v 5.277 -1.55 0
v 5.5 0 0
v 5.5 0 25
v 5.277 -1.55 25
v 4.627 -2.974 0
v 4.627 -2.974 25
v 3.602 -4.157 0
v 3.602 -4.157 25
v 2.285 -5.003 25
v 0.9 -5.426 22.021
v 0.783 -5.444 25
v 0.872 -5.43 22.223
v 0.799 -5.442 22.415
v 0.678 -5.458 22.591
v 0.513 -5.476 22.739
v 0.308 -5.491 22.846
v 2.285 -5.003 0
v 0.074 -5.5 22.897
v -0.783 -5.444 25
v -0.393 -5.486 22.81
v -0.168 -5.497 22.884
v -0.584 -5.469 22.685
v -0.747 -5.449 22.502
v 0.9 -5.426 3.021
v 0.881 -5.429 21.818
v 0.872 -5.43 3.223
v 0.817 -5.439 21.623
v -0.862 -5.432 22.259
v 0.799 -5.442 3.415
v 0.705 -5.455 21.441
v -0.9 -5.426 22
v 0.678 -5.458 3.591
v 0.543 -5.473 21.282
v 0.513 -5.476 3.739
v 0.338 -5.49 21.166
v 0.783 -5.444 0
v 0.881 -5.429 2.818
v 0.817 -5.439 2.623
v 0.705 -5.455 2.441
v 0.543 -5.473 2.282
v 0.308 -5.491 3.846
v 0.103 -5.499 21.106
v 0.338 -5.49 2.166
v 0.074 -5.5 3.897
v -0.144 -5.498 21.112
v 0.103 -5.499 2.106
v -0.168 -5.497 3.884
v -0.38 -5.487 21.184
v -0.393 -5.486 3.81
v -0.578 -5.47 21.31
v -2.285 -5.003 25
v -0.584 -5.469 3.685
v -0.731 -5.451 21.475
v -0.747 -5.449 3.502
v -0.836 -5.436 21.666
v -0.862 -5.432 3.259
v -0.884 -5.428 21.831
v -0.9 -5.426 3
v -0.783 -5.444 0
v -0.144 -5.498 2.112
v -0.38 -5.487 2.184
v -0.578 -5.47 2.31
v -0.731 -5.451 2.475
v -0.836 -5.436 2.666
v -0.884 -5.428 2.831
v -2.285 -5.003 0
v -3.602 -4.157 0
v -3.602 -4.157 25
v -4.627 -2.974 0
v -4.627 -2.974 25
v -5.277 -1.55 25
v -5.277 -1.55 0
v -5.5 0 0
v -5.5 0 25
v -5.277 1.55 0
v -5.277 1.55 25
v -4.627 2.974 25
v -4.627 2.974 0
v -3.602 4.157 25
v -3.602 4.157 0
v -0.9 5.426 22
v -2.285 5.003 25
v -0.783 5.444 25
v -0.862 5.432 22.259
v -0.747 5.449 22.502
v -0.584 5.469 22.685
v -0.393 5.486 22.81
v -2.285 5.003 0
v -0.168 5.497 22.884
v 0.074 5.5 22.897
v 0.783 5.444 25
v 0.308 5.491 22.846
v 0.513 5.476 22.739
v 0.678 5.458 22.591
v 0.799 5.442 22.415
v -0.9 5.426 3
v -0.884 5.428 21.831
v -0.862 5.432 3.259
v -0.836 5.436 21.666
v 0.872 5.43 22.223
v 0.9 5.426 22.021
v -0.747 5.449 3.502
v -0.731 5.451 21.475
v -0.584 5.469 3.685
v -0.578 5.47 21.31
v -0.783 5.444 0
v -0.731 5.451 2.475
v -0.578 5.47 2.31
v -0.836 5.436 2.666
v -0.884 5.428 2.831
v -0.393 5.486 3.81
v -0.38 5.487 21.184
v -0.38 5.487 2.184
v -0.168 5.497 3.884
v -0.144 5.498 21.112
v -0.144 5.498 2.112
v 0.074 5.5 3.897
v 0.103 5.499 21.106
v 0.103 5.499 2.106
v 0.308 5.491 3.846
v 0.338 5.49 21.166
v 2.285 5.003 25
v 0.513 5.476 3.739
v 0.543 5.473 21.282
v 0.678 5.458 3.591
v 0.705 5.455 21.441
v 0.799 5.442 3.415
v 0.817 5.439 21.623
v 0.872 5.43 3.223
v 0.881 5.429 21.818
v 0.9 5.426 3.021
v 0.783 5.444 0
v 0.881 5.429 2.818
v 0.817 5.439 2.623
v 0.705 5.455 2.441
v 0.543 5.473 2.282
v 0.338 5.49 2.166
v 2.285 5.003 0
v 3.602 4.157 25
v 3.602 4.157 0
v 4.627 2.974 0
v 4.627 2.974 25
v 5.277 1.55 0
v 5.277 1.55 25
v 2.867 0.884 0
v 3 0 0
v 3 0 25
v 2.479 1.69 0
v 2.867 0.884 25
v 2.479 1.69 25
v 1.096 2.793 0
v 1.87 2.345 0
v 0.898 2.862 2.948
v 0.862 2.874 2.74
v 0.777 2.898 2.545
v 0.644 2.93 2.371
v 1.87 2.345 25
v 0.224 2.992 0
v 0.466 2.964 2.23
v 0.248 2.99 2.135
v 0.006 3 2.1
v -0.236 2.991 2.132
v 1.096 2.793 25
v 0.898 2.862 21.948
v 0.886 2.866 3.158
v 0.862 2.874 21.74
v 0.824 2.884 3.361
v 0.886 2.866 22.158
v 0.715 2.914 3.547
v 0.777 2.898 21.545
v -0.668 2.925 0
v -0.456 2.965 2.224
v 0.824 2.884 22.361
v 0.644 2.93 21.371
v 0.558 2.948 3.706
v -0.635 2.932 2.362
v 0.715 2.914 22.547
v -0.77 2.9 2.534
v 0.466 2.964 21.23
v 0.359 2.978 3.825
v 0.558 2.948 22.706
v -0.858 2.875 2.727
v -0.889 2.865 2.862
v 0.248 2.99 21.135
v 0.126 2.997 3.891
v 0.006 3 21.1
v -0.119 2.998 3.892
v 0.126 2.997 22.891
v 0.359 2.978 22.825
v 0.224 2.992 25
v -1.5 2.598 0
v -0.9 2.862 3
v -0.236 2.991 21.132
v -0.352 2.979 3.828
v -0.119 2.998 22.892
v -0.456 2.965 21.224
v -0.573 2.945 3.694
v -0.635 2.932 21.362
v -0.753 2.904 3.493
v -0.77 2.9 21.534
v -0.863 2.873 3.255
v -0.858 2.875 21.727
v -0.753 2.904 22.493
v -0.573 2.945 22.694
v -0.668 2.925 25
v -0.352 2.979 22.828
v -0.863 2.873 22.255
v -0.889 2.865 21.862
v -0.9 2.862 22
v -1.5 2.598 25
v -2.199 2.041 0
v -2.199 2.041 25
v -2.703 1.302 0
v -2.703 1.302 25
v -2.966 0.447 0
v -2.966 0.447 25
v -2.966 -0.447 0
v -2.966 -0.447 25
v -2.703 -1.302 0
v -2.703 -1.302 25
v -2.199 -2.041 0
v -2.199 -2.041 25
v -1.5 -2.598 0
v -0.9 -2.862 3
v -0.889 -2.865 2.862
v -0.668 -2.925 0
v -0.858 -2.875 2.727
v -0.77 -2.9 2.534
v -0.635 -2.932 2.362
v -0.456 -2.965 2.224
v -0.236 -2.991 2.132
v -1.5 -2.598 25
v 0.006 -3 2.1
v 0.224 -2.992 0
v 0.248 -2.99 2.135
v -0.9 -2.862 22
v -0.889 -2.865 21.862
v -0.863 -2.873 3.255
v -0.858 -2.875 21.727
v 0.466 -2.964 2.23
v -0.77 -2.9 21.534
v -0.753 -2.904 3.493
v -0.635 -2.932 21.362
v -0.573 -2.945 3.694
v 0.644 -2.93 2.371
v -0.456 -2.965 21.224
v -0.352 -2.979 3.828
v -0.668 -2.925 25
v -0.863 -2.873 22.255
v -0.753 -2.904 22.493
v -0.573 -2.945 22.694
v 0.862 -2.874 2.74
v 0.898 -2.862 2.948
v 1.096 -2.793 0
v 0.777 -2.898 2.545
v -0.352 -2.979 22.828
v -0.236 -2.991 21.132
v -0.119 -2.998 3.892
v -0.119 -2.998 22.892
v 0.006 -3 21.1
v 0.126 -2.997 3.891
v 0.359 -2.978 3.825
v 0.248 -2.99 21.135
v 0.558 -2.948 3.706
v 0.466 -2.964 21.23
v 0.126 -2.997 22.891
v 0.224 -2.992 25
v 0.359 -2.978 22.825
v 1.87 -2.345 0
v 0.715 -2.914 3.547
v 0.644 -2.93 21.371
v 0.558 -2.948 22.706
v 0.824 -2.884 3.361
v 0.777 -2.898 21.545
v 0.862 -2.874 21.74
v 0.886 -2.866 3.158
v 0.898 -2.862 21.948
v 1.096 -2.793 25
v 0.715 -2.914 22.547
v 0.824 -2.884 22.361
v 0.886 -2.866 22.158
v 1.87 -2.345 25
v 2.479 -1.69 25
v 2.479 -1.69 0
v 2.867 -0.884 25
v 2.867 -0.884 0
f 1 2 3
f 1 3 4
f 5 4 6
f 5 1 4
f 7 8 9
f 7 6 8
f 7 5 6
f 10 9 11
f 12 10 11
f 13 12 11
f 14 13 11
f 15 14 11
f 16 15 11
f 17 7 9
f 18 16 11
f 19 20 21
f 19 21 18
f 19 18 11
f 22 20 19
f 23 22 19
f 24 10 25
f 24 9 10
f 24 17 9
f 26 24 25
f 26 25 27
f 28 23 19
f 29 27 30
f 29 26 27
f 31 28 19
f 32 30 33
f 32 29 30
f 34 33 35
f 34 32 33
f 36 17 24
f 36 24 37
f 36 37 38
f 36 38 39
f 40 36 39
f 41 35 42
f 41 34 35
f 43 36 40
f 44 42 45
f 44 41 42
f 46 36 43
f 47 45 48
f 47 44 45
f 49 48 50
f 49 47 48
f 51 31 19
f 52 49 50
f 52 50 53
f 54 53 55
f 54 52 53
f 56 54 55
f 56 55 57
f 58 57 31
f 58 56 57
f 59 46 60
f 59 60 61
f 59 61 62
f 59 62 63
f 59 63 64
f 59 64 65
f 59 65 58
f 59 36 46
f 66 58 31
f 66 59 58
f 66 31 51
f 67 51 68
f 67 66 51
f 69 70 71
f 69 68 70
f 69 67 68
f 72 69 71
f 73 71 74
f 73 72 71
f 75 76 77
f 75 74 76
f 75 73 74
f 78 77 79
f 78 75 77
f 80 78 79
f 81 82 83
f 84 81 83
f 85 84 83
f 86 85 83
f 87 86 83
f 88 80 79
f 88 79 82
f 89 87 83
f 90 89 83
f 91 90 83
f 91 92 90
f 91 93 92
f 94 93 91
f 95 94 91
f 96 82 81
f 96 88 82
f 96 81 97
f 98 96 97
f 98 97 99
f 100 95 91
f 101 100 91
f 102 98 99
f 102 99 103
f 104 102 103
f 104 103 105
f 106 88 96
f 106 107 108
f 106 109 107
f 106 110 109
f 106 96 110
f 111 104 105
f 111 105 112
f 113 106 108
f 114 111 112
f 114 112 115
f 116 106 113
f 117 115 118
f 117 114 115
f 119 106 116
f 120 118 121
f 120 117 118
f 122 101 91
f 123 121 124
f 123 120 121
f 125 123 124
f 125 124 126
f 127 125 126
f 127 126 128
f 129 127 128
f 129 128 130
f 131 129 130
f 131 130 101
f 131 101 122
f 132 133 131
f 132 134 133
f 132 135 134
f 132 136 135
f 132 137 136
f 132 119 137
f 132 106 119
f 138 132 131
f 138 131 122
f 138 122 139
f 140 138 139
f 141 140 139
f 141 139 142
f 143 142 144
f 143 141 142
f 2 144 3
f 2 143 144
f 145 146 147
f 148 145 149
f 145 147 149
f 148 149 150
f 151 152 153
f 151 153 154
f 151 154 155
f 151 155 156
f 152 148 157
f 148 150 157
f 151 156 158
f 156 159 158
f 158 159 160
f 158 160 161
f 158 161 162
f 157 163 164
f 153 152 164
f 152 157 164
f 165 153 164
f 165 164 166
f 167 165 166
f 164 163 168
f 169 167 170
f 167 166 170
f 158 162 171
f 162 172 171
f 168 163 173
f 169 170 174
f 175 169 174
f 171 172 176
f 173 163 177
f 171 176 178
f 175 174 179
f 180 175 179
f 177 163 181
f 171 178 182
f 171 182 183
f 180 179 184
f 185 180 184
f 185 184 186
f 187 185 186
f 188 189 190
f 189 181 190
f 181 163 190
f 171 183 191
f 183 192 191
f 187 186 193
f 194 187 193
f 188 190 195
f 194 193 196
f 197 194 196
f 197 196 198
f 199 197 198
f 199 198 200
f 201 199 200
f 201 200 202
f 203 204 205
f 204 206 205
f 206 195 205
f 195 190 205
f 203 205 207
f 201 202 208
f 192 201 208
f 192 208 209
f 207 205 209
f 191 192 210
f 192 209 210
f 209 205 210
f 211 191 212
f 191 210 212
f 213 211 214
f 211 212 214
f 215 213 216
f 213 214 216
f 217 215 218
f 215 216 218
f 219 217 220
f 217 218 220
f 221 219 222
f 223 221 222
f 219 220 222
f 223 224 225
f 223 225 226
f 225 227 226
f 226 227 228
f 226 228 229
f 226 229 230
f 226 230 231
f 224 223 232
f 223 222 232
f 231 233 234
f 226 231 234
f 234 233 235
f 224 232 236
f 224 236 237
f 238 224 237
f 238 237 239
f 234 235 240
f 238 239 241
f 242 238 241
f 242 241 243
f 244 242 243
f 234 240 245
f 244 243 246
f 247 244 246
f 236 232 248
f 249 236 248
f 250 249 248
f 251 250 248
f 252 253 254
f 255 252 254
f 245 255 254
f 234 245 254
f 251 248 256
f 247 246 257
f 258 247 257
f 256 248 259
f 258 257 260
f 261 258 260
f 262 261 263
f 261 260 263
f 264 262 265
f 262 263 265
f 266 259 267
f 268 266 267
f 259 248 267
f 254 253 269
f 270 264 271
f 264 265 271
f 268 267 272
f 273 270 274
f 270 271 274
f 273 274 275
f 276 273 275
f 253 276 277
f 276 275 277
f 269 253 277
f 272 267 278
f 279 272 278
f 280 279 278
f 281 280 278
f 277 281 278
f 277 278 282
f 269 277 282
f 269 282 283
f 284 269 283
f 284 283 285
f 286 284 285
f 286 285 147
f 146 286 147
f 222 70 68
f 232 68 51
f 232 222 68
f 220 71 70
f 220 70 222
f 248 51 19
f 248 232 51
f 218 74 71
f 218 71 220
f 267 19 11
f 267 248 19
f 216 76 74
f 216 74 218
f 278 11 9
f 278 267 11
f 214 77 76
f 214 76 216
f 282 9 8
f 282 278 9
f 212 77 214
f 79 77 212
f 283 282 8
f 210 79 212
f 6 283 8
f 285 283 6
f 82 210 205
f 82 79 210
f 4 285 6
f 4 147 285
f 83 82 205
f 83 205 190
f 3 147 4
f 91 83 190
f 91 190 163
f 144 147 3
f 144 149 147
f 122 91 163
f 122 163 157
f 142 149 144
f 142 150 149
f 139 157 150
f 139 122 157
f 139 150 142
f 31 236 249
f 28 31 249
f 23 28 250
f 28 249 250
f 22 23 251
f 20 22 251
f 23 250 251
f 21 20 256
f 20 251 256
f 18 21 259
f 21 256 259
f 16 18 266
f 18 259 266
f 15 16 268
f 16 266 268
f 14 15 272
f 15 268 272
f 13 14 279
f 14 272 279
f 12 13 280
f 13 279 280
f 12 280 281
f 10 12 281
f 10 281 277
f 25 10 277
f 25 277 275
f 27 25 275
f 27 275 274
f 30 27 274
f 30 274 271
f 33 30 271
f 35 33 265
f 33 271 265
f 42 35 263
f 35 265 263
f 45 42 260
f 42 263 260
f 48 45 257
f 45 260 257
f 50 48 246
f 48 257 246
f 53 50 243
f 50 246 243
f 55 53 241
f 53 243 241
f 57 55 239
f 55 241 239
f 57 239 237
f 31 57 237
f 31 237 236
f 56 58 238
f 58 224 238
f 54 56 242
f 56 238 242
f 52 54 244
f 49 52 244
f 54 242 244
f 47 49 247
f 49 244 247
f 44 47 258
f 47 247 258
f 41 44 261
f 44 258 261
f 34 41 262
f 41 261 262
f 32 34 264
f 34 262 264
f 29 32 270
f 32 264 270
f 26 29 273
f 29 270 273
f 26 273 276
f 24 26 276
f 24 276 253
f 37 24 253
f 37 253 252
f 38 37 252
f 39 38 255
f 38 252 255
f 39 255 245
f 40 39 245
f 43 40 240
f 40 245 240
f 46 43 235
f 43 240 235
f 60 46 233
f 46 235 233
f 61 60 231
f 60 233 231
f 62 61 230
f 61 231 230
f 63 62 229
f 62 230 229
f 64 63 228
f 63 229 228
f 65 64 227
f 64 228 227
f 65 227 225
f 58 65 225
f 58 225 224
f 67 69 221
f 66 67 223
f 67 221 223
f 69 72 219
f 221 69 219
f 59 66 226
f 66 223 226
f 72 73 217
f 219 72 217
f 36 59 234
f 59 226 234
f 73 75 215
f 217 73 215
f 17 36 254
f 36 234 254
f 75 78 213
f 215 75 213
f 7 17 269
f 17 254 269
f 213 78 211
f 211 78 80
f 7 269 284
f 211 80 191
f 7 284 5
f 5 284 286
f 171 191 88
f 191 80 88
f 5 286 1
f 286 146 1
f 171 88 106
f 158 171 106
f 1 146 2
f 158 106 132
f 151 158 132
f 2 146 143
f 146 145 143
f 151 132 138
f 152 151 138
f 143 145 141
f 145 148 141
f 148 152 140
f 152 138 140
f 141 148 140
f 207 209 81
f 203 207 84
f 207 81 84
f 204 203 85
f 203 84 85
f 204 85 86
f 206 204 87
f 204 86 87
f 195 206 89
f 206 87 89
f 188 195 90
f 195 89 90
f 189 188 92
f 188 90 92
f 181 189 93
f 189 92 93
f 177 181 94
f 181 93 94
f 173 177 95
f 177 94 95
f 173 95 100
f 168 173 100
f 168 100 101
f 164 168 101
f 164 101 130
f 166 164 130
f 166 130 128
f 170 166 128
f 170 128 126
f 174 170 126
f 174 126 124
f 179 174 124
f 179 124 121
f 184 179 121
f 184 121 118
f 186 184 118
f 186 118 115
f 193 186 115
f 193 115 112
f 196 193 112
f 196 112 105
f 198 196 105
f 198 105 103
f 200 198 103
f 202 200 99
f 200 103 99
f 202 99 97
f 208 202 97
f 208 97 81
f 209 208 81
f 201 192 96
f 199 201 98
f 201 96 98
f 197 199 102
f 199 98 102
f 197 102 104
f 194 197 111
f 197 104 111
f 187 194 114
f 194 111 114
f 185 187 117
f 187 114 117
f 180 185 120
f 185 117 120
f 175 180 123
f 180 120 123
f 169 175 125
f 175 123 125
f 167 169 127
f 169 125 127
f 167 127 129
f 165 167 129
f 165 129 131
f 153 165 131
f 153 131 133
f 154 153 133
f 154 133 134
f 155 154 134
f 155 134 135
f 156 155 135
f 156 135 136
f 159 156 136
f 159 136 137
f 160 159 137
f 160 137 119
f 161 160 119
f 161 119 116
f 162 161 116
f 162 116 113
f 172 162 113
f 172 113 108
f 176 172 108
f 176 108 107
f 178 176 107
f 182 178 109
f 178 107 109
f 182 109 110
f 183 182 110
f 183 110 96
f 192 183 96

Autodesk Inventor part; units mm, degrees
ref_plane "YZ Plane" through (0, 0, 0) normal (1, 0, 0) x (0, 1, 0)
ref_plane "XZ Plane" through (0, 0, 0) normal (0, 1, 0) x (-1, 0, 0)
ref_plane "XY Plane" through (0, 0, 0) normal (0, 0, 1) x (1, 0, 0)
sketch "Sketch1" plane through (0, 0, 0) normal (0, 0, 1) x (1, 0, 0)
  circle A0 centre (0, 0) radius 5.5
  dimension "d13" = 11
extrude "Extrusion1" add sketch "Sketch1" along normal blind 25
sketch "Sketch2" plane through (0, 0, 25) normal (0, 0, 1) x (1, 0, 0)
  circle A0 centre (0, 0) radius 4 projected
  circle A1 centre (0, 0) radius 3
  dimension "d3" = 6
extrude "Extrusion2" cut sketch "Sketch2" along normal through all both and the other way through all contours A1
sketch "Sketch3" plane through (0, 0, 0) normal (0, 1, 0) x (-1, 0, 0)
  line L0 (4, 25) -> (-4, 25) projected
  line L1 (0, 25) -> (0, 0)
  line L2 (0, 0) -> (0, 26.9875)
  line L3 (0, 26.9875) -> (0, -1.5875)
sketch "Sketch4" plane through (0, 0, 0) normal (1, 0, 0) x (0, 1, 0)
  point P0 (0, 0)
sketch "Sketch5" plane through (0, 0, 0) normal (0, 1, 0) x (-1, 0, 0)
  line L0 (0, 0) -> (0, 2)
  line L1 (0, 2) -> (0, 3)
  circle A0 centre (0, 3) radius 0.9
  line L2 (0, 25) -> (0, 22)
  circle A1 centre (0, 22) radius 0.9
  dimension "d6" = 2
  dimension "d7" = 1
  dimension "d8" = 1.8
  dimension "d9" = 3
  dimension "d10" = 1.8
extrude "Extrusion3" cut sketch "Sketch5" along normal through all both and the other way through all
properties part number "connector"
